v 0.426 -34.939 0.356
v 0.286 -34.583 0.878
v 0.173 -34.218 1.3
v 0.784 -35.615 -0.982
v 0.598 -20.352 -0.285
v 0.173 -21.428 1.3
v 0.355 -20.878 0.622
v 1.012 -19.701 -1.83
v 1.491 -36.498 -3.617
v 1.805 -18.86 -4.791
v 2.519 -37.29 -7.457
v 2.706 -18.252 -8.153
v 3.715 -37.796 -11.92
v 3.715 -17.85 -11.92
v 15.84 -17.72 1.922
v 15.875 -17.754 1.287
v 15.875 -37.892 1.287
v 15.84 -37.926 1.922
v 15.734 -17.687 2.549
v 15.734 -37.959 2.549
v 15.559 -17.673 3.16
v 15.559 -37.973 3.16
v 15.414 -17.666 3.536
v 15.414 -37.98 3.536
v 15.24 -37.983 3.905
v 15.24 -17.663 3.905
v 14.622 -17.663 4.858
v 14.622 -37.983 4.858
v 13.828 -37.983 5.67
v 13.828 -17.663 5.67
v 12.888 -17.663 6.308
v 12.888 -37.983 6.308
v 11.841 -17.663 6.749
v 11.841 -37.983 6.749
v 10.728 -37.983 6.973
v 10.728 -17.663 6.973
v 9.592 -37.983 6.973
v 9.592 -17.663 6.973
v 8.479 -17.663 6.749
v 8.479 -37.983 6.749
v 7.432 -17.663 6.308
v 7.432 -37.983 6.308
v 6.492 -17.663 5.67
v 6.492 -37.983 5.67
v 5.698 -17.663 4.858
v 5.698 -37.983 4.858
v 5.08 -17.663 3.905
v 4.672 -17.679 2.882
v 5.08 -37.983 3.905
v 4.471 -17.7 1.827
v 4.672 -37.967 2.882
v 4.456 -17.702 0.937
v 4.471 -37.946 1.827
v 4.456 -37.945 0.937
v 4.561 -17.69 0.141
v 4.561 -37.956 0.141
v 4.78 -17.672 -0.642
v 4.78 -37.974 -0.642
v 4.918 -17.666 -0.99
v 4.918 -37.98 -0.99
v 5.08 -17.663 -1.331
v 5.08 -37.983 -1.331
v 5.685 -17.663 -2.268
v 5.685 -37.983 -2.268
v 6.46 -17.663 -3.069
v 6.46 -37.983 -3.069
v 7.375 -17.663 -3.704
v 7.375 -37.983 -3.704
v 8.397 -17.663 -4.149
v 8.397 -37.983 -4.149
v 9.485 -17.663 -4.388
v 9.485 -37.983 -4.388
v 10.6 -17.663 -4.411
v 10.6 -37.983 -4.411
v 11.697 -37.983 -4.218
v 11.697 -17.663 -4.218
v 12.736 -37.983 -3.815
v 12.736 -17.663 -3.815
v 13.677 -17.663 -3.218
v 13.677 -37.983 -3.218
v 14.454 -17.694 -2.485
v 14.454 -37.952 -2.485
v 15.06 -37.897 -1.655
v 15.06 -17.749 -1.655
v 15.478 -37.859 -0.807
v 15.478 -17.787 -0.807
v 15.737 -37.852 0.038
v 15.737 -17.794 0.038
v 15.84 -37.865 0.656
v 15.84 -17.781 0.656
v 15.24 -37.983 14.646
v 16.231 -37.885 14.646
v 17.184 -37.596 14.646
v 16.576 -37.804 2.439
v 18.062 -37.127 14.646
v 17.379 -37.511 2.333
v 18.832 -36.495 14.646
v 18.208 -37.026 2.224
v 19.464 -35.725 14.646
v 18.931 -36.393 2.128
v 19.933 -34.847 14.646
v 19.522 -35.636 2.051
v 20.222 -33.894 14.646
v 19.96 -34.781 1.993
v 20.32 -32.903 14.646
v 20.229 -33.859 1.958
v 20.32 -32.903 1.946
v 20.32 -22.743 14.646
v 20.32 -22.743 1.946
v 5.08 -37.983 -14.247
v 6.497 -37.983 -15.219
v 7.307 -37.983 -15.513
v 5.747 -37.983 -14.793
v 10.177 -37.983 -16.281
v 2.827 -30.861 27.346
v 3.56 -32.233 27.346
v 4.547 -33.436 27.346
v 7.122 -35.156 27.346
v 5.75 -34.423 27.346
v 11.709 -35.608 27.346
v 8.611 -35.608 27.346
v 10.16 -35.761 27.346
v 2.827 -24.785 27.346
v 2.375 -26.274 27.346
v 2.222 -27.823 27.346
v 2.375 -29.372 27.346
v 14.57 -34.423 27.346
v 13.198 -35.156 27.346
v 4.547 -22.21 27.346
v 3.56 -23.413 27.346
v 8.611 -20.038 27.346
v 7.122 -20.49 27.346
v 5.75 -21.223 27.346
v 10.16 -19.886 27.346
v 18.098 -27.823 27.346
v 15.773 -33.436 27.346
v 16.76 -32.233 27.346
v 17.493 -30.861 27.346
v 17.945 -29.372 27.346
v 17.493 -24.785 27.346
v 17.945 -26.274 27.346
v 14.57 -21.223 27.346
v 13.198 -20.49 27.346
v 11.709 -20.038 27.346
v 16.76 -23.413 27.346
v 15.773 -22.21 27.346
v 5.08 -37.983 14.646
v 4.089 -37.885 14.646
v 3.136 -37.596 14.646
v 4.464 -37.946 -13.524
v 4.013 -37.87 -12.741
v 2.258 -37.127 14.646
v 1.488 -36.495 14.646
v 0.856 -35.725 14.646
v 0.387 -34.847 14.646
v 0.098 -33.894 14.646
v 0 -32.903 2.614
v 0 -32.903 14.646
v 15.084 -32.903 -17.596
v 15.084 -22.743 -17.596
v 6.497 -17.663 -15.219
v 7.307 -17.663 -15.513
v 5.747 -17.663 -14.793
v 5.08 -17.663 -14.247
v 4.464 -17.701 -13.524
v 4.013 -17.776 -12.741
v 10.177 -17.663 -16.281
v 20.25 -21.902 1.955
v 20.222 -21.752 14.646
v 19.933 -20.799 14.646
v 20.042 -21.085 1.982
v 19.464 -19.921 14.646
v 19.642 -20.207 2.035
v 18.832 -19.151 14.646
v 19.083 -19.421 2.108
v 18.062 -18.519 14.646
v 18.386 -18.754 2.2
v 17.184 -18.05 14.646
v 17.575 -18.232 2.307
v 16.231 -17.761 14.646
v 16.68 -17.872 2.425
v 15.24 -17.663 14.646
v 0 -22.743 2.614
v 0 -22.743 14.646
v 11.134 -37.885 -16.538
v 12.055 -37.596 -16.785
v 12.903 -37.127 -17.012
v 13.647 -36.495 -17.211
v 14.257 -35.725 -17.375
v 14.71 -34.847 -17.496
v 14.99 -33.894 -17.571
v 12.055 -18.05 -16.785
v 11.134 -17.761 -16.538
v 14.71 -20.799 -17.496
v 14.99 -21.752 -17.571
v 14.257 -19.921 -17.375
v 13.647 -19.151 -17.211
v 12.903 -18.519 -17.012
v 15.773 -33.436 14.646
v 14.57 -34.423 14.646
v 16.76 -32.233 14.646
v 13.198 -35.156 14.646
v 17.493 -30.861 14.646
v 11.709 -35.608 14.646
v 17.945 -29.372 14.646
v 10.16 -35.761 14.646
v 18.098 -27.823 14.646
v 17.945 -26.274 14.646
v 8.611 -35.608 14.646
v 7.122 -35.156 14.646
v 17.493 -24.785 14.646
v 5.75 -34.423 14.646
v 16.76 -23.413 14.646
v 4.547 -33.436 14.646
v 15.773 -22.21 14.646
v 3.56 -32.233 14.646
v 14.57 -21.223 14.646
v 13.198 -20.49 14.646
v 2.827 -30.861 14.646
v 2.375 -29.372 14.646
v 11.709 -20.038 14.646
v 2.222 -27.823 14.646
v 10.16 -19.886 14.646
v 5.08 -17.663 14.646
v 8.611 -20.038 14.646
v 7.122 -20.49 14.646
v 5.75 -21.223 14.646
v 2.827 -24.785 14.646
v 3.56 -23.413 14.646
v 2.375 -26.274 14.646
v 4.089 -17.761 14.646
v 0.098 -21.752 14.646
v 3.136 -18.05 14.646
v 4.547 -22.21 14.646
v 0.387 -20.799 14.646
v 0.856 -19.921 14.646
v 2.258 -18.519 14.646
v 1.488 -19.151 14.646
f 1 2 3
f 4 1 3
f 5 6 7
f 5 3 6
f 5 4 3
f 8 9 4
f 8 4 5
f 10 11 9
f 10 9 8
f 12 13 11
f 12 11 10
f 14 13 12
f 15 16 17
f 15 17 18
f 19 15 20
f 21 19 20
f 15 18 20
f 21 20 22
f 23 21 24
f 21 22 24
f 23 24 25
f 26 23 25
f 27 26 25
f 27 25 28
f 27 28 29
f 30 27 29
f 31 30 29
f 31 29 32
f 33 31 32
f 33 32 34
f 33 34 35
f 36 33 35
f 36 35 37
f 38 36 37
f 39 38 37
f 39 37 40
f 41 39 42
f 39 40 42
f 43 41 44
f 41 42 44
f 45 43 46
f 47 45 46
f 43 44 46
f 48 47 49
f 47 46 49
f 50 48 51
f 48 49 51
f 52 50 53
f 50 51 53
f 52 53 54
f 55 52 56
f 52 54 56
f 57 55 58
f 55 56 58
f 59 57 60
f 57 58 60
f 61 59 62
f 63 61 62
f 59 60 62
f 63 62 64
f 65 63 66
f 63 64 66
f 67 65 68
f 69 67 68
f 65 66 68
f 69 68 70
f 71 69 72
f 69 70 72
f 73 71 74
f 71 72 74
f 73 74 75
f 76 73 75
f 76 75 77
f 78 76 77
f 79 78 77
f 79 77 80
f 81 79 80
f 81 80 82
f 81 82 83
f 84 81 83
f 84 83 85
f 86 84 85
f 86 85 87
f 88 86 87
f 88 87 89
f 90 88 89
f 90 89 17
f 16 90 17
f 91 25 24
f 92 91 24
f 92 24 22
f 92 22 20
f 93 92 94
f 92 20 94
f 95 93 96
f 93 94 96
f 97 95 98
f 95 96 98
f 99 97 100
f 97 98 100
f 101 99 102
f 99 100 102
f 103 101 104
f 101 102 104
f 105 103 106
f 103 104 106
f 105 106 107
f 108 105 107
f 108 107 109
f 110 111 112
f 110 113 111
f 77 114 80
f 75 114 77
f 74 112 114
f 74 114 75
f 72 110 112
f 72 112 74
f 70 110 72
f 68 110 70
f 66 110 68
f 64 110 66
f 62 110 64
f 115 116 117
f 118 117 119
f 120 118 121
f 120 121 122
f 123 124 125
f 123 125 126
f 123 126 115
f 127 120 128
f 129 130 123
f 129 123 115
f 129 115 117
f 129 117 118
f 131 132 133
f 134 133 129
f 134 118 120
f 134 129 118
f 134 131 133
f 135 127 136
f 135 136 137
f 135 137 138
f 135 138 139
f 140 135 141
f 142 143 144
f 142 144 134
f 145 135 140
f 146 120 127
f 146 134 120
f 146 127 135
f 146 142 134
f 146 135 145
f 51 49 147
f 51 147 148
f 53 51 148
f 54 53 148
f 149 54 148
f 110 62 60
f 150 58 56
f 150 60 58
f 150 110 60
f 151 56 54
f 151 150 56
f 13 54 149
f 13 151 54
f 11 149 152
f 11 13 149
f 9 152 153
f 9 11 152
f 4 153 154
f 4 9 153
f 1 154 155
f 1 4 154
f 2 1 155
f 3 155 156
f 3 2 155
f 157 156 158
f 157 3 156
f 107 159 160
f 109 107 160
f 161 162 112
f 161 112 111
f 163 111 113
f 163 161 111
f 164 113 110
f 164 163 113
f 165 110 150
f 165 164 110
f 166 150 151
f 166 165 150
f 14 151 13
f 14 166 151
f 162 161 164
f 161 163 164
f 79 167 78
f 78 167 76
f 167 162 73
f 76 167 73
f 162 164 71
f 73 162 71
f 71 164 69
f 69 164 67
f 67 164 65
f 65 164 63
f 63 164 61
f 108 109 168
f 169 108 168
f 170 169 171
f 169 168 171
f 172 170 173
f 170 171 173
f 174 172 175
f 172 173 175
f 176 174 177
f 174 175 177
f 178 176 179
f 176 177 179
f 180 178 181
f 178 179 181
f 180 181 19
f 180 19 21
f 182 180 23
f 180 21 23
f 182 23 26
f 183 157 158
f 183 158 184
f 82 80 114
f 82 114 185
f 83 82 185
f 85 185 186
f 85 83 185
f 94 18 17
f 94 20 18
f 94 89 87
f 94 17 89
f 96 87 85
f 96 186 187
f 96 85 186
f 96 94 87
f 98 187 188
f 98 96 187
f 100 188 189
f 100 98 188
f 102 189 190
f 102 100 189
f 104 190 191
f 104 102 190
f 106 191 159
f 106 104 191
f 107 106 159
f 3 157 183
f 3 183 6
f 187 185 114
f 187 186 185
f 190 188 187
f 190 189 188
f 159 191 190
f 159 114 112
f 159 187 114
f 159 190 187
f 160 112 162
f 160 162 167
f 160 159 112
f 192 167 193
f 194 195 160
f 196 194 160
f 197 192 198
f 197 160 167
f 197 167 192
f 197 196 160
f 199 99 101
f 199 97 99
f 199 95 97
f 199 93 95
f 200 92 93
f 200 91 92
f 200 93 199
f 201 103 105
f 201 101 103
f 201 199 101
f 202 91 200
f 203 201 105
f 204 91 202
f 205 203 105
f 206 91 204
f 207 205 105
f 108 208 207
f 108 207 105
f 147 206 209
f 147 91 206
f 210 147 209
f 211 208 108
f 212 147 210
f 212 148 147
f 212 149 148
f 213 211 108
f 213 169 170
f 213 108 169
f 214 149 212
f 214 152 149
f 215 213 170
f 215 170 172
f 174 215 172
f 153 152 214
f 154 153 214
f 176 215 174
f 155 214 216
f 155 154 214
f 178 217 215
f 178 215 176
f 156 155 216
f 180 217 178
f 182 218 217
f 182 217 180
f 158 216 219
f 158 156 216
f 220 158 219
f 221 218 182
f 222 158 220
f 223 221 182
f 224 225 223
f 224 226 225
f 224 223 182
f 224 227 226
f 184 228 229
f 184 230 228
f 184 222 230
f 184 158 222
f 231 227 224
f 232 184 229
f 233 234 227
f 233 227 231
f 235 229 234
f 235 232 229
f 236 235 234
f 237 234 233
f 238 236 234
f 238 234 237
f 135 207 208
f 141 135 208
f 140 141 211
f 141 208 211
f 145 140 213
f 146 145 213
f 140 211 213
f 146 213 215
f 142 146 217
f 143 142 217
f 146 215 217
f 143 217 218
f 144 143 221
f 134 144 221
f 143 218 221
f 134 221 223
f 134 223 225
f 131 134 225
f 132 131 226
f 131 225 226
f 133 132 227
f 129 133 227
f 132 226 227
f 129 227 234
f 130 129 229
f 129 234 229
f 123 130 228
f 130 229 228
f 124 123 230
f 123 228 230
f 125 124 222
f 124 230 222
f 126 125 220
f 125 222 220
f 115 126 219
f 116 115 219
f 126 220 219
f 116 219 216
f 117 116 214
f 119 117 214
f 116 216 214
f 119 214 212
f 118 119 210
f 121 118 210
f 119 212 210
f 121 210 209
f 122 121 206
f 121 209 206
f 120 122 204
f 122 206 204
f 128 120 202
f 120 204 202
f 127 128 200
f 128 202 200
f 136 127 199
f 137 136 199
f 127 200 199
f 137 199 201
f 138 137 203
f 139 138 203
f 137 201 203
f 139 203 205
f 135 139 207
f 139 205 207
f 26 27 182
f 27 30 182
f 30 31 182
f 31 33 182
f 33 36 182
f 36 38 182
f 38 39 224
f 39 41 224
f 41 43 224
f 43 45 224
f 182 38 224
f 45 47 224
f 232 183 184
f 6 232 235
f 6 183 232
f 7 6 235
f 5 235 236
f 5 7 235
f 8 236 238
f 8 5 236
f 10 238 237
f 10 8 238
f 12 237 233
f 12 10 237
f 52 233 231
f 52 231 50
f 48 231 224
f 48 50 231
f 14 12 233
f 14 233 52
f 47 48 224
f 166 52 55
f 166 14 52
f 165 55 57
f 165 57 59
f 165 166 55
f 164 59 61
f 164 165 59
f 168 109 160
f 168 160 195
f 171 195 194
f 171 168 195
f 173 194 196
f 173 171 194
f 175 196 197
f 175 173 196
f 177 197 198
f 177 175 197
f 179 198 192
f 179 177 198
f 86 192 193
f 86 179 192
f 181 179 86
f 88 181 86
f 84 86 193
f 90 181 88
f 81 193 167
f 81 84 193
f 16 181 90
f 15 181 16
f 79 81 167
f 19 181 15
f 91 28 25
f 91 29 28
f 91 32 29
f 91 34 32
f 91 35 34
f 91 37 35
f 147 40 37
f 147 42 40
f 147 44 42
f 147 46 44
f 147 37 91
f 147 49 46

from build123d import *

# Parameters (mm, degrees)
F0_W        = 20.32
F0_H        = 38.1
F1_DEPTH    = 20.32
F2_SIZE2    = 6.8059094878
F2_SIZE     = 25.4
F2_2_SIZE2  = 6.8059094878
F2_2_SIZE   = 25.4
F3_R        = 5.715
F4_DEPTH    = 25.4
F5_W        = 68.5800006613
F5_H        = 10.5876065791
F6_DEPTH    = 35.56
F7_R        = 7.9375
F8_DEPTH    = 12.7
F9_T1_DEPTH = 46.99
F9_T3_DEPTH = 54.5211276147
F9_T5_DEPTH = 34.9846968374
F9_T7_DEPTH = 23.6639734387


# Not quite as in the source:
# - a fillet or chamfer that OpenCascade refuses, or shapes differently, is made with other operations: its cross-section is extruded or revolved along the edge and cut away or added


with BuildPart() as f1:
    # F0 (on Right) → F1 (new body)
    with BuildSketch(Plane.YZ):
        with Locations((-27.8230281547, -4.4044164286)):
            Rectangle(F0_W, F0_H)
    extrude(amount=F1_DEPTH)

    # F2
    f2_edges = [f1.edges().sort_by_distance(p)[0] for p in [
        (20.32, -27.823028, -23.454416),
    ]]
    f2_side = f1.faces().sort_by_distance((20.32, -27.823028, -4.404416))[0]
    chamfer(f2_edges, length=F2_SIZE, length2=F2_SIZE2, reference=f2_side)

    # F2#2
    f2_2_edges = [f1.edges().sort_by_distance(p)[0] for p in [
        (0, -27.823028, -23.454416),
    ]]
    f2_2_side = f1.faces().sort_by_distance((0, -27.823028, -4.404416))[0]
    chamfer(f2_2_edges, length=F2_2_SIZE, length2=F2_2_SIZE2, reference=f2_2_side)

    # F3 (on face) → F4 (cut)
    with BuildSketch(Plane.XZ.offset(37.9830281547)):
        with Locations((10.16, 1.2867113903)):
            Circle(F3_R)
    extrude(amount=-F4_DEPTH, mode=Mode.SUBTRACT)

    # F5 (on face) → F6 (cut)
    with BuildSketch(Plane(origin=(18.4724222096, 0, -4.9496706133), x_dir=(0, 1, 0), z_dir=(0.9659258263, 0, -0.2588190451))):
        with Locations((-23.6119744368, -18.386438489)):
            Rectangle(F5_W, F5_H)
    extrude(amount=-F6_DEPTH, mode=Mode.SUBTRACT)

    # F7 (on face) → F8 (join)
    with BuildSketch(Plane.XY.offset(14.6455835714)):
        with Locations((10.16, -27.8230281547)):
            Circle(F7_R)
    extrude(amount=F8_DEPTH)

    # F9: fillet of radius 5.08 on 8 edges, made by hand

    # F9_s2 → F9_t1 (cut)
    with BuildSketch(Plane.XY.offset(-19.6444164286)):
        with BuildLine():
            ThreePointArc((20.32, -22.7430281547), (18.8321024484, -19.1509257062), (15.24, -17.6630281547))
            Line((15.24, -17.6630281547), (20.32, -17.6630281547))
            Line((20.32, -17.6630281547), (20.32, -22.7430281547))
        make_face()
        with BuildLine():
            ThreePointArc((0, -22.7430281547), (1.4878975516, -19.1509257062), (5.08, -17.6630281547))
            Line((5.08, -17.6630281547), (0, -17.6630281547))
            Line((0, -17.6630281547), (0, -22.7430281547))
        make_face()
        with BuildLine():
            ThreePointArc((5.08, -37.9830281547), (1.4878975516, -36.4951306031), (0, -32.9030281547))
            Line((0, -32.9030281547), (0, -37.9830281547))
            Line((0, -37.9830281547), (5.08, -37.9830281547))
        make_face()
        with BuildLine():
            ThreePointArc((15.24, -37.9830281547), (18.8321024484, -36.4951306031), (20.32, -32.9030281547))
            Line((20.32, -32.9030281547), (20.32, -37.9830281547))
            Line((20.32, -37.9830281547), (15.24, -37.9830281547))
        make_face()
    extrude(amount=F9_T1_DEPTH, mode=Mode.SUBTRACT)

    # F9_s4 → F9_t3 (cut)
    with BuildSketch(Plane(origin=(7.4354809742, 0, 27.7495927742), x_dir=(0, 1, 0), z_dir=(-0.2588190451, 0, -0.9659258263))):
        with BuildLine():
            ThreePointArc((-37.9830281547, 14.0440587081), (-36.4951306031, 17.6361611565), (-32.9030281547, 19.1240587081))
            Line((-32.9030281547, 19.1240587081), (-37.9830281547, 19.1240587081))
            Line((-37.9830281547, 19.1240587081), (-37.9830281547, 14.0440587081))
        make_face()
        with BuildLine():
            ThreePointArc((-22.7430281547, 19.1240587081), (-19.1509257062, 17.6361611565), (-17.6630281547, 14.0440587081))
            Line((-17.6630281547, 14.0440587081), (-17.6630281547, 19.1240587081))
            Line((-17.6630281547, 19.1240587081), (-22.7430281547, 19.1240587081))
        make_face()
    extrude(amount=F9_T3_DEPTH, mode=Mode.SUBTRACT)

    # F9_s6 → F9_t5 (cut)
    with BuildSketch(Plane.XZ.offset(10.330679736)):
        with BuildLine():
            ThreePointArc((7.3074886766, -15.5125290504), (5.0301869773, -14.1977283012), (3.7153862282, -11.9204266019))
            Line((3.7153862282, -11.9204266019), (4.4744867946, -14.7534284839))
            Line((4.4744867946, -14.7534284839), (7.3074886766, -15.5125290504))
        make_face()
    extrude(amount=F9_T5_DEPTH, mode=Mode.SUBTRACT)

    # F9_s8 → F9_t7 (cut)
    with BuildSketch(Plane.XZ.offset(15.9910414353)):
        with BuildLine():
            ThreePointArc((0, 2.6143782591), (0.0434601042, 1.9513052026), (0.1730968025, 1.29957751))
            Line((0.1730968025, 1.29957751), (0, 1.9455835714))
            Line((0, 1.9455835714), (0, 2.6143782591))
        make_face()
    extrude(amount=F9_T7_DEPTH, mode=Mode.SUBTRACT)


solid = f1.part
